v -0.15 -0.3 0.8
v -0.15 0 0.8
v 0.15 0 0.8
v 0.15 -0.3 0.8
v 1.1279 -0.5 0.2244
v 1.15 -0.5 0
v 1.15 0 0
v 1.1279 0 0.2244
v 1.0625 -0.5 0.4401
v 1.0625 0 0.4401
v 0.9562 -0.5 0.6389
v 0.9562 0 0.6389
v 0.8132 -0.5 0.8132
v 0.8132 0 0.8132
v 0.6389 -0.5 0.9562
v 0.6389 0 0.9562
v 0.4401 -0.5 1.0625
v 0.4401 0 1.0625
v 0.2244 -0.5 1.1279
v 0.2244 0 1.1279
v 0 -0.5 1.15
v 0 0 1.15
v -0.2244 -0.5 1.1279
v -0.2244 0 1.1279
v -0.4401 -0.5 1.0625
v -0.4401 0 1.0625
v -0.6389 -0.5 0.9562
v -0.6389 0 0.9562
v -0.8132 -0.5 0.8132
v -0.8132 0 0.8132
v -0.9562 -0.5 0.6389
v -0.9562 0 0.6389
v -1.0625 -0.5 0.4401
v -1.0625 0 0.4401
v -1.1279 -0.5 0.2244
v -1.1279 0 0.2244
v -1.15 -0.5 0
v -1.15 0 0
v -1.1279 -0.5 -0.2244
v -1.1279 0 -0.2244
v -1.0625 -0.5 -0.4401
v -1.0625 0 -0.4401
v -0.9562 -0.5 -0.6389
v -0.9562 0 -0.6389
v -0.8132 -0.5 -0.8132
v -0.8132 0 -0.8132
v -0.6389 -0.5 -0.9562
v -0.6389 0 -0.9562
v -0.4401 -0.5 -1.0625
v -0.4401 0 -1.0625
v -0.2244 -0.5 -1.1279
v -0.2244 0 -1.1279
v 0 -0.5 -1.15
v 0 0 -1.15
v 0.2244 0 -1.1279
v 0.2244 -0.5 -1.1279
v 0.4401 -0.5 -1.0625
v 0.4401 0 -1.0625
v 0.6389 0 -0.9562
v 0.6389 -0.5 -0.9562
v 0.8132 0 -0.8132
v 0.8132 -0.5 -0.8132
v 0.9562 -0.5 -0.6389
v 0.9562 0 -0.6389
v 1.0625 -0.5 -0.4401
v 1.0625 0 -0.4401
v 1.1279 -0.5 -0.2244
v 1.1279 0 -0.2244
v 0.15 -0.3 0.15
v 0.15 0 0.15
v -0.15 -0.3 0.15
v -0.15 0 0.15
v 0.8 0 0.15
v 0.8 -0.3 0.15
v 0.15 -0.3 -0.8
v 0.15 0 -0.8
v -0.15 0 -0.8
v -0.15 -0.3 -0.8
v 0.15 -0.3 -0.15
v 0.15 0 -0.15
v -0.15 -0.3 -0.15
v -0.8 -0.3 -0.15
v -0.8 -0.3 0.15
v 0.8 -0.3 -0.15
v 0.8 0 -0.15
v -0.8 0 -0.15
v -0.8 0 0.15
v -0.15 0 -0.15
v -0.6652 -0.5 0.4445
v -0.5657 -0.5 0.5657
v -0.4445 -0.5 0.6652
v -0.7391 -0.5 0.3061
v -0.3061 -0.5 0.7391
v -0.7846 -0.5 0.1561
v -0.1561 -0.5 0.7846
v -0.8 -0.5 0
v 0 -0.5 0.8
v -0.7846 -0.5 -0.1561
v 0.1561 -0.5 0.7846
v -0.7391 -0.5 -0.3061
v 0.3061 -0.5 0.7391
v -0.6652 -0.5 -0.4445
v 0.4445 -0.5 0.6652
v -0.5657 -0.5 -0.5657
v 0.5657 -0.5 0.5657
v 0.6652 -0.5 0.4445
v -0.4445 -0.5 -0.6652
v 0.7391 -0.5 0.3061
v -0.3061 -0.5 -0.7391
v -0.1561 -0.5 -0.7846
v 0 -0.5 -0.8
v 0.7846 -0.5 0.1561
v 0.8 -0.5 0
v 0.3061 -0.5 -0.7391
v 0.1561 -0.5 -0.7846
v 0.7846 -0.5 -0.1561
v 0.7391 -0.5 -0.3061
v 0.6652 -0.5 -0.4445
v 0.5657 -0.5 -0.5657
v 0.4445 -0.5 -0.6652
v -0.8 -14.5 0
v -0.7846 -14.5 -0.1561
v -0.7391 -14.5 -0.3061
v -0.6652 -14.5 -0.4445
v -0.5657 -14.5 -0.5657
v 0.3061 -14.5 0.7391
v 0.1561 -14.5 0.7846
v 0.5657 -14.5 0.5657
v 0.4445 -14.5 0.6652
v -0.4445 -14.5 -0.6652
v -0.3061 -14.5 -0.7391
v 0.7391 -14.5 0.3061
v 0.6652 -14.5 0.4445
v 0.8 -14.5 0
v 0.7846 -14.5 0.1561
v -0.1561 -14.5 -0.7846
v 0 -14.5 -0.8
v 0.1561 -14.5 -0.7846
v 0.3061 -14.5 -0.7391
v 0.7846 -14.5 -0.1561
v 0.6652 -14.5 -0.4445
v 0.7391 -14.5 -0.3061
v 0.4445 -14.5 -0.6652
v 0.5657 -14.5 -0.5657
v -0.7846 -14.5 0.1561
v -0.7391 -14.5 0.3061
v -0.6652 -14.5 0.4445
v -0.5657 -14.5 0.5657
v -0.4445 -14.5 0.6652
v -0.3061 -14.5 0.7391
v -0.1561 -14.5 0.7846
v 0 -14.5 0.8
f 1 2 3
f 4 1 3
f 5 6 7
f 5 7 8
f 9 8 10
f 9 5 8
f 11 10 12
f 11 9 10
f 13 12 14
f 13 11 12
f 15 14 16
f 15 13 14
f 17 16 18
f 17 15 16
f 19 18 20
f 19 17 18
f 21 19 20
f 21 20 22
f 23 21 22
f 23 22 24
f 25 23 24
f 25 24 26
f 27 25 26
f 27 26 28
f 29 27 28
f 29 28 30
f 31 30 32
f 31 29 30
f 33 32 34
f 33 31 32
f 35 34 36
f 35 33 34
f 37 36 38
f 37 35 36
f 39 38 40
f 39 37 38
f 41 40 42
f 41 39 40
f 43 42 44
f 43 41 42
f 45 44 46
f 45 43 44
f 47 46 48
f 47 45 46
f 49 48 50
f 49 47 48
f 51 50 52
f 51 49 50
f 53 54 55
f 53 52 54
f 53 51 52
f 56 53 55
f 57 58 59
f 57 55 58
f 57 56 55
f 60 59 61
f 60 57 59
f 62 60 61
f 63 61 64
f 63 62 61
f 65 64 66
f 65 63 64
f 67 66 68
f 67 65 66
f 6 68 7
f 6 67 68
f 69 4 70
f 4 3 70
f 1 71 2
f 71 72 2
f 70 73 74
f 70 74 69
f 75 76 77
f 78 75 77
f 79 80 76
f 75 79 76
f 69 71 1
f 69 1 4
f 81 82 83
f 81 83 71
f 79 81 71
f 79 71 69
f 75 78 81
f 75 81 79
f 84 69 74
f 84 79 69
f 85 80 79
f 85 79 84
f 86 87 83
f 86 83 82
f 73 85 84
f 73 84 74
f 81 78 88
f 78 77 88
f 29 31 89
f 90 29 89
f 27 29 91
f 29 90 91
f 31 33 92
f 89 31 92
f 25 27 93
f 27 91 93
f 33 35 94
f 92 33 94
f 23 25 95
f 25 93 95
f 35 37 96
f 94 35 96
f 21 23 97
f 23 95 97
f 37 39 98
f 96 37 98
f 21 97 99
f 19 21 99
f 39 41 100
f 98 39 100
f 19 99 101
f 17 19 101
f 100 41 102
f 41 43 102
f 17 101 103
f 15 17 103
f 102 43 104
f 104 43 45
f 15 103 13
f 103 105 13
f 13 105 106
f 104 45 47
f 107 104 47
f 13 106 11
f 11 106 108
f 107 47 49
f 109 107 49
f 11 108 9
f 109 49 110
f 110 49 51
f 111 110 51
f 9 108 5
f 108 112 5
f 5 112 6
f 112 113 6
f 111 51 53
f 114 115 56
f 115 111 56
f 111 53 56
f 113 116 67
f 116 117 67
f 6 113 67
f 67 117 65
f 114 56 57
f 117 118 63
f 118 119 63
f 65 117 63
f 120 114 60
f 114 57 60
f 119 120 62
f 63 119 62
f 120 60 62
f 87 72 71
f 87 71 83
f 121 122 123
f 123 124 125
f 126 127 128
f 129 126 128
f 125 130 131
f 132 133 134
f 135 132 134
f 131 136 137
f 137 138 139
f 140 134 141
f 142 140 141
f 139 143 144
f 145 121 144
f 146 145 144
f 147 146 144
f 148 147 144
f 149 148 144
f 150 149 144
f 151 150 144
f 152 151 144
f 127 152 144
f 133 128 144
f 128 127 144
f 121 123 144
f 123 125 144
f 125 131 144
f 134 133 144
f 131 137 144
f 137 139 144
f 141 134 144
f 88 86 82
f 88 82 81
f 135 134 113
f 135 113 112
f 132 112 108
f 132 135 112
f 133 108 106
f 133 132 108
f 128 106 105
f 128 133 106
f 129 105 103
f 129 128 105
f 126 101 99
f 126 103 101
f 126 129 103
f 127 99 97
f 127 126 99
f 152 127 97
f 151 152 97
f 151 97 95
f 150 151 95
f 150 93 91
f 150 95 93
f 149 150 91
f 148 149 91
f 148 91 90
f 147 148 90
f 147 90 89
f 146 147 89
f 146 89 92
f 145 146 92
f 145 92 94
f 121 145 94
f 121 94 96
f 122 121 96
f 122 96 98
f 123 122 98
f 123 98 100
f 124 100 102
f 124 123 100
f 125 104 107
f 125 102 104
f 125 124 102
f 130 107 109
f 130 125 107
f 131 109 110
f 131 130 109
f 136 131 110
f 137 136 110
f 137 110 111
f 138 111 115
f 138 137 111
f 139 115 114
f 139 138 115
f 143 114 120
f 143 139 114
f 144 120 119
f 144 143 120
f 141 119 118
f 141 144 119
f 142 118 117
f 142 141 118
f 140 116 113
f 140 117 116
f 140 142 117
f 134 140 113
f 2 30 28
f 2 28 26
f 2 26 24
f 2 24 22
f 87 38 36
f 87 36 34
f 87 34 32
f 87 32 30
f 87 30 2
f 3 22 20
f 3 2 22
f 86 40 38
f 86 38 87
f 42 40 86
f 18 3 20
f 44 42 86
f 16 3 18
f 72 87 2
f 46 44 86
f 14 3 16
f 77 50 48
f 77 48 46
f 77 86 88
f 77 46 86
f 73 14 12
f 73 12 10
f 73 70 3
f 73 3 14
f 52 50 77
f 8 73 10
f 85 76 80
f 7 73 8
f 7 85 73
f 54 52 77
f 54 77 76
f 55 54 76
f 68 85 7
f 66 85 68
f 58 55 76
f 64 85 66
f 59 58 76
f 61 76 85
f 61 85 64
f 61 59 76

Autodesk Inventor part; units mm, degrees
ref_plane "YZ Plane" through (0, 0, 0) normal (1, 0, 0) x (0, 1, 0)
ref_plane "XZ Plane" through (0, 0, 0) normal (0, 1, 0) x (-1, 0, 0)
ref_plane "XY Plane" through (0, 0, 0) normal (0, 0, 1) x (1, 0, 0)
sketch "스케치3" plane through (0, 0, 0) normal (0, 0, 1) x (1, 0, 0)
  line L0 (0, 0) -> (1.15, 0)
  line L1 (1.15, 0) -> (1.15, -0.5)
  line L2 (1.15, -0.5) -> (0.8, -0.5)
  line L3 (0.8, -0.5) -> (0.8, -14.5)
  line L4 (0.8, -14.5) -> (0, -14.5)
  line L5 (0, -14.5) -> (0, 0)
  dimension "d13" = 1.15
  dimension "d14" = 0.5
  dimension "d15" = 14
  dimension "d16" = 0.8
revolve "회전2" add sketch "스케치3" angle 360 about axis through (0, -14.5, 0) along (0, 1, 0)
thread "스레드2" size "M1.6x0.35" class "6g" standard "ISO Metric profile" full length
sketch "스케치4" plane through (0, 0, 0) normal (0, 1, 0) x (1, 0, 0)
  line L0 (-0.15, -0.8) -> (0.15, -0.8)
  line L1 (0.15, -0.8) -> (0.15, 0.8)
  line L2 (0.15, 0.8) -> (-0.15, 0.8)
  line L3 (-0.15, 0.8) -> (-0.15, -0.8)
  line L4 (-0.15, -0.8) -> (0.15, 0.8) construction
  line L5 (0.15, -0.8) -> (-0.15, 0.8) construction
  line L6 (0.8, -0.15) -> (-0.8, -0.15)
  line L7 (-0.8, -0.15) -> (-0.8, 0.15)
  line L8 (-0.8, 0.15) -> (0.8, 0.15)
  line L9 (0.8, 0.15) -> (0.8, -0.15)
  circle A0 centre (0, 0) radius 0.8 projected
  line L10 (0.8, -0.15) -> (-0.8, 0.15) construction
  line L11 (-0.8, -0.15) -> (0.8, 0.15) construction
  dimension "d21" = 0.3
  dimension "d22" = 1.6
  dimension "d23" = 1.6
  dimension "d24" = 0.3
extrude "돌출2" cut sketch "스케치4" against normal blind 0.3 contours L3 A0 L0 | A0 L1 L0 | A0 L3 L6 L1 | L6 A0 L8 L3 | L3 L8 L1 L6 | L6 L7 A0 | L1 L8 A0 L6 | A0 L9 L6 | L3 A0 L1 L8 | L7 L8 A0 | A0 L8 L9 | L3 L2 A0 | A0 L2 L1
properties part number "Screw"
